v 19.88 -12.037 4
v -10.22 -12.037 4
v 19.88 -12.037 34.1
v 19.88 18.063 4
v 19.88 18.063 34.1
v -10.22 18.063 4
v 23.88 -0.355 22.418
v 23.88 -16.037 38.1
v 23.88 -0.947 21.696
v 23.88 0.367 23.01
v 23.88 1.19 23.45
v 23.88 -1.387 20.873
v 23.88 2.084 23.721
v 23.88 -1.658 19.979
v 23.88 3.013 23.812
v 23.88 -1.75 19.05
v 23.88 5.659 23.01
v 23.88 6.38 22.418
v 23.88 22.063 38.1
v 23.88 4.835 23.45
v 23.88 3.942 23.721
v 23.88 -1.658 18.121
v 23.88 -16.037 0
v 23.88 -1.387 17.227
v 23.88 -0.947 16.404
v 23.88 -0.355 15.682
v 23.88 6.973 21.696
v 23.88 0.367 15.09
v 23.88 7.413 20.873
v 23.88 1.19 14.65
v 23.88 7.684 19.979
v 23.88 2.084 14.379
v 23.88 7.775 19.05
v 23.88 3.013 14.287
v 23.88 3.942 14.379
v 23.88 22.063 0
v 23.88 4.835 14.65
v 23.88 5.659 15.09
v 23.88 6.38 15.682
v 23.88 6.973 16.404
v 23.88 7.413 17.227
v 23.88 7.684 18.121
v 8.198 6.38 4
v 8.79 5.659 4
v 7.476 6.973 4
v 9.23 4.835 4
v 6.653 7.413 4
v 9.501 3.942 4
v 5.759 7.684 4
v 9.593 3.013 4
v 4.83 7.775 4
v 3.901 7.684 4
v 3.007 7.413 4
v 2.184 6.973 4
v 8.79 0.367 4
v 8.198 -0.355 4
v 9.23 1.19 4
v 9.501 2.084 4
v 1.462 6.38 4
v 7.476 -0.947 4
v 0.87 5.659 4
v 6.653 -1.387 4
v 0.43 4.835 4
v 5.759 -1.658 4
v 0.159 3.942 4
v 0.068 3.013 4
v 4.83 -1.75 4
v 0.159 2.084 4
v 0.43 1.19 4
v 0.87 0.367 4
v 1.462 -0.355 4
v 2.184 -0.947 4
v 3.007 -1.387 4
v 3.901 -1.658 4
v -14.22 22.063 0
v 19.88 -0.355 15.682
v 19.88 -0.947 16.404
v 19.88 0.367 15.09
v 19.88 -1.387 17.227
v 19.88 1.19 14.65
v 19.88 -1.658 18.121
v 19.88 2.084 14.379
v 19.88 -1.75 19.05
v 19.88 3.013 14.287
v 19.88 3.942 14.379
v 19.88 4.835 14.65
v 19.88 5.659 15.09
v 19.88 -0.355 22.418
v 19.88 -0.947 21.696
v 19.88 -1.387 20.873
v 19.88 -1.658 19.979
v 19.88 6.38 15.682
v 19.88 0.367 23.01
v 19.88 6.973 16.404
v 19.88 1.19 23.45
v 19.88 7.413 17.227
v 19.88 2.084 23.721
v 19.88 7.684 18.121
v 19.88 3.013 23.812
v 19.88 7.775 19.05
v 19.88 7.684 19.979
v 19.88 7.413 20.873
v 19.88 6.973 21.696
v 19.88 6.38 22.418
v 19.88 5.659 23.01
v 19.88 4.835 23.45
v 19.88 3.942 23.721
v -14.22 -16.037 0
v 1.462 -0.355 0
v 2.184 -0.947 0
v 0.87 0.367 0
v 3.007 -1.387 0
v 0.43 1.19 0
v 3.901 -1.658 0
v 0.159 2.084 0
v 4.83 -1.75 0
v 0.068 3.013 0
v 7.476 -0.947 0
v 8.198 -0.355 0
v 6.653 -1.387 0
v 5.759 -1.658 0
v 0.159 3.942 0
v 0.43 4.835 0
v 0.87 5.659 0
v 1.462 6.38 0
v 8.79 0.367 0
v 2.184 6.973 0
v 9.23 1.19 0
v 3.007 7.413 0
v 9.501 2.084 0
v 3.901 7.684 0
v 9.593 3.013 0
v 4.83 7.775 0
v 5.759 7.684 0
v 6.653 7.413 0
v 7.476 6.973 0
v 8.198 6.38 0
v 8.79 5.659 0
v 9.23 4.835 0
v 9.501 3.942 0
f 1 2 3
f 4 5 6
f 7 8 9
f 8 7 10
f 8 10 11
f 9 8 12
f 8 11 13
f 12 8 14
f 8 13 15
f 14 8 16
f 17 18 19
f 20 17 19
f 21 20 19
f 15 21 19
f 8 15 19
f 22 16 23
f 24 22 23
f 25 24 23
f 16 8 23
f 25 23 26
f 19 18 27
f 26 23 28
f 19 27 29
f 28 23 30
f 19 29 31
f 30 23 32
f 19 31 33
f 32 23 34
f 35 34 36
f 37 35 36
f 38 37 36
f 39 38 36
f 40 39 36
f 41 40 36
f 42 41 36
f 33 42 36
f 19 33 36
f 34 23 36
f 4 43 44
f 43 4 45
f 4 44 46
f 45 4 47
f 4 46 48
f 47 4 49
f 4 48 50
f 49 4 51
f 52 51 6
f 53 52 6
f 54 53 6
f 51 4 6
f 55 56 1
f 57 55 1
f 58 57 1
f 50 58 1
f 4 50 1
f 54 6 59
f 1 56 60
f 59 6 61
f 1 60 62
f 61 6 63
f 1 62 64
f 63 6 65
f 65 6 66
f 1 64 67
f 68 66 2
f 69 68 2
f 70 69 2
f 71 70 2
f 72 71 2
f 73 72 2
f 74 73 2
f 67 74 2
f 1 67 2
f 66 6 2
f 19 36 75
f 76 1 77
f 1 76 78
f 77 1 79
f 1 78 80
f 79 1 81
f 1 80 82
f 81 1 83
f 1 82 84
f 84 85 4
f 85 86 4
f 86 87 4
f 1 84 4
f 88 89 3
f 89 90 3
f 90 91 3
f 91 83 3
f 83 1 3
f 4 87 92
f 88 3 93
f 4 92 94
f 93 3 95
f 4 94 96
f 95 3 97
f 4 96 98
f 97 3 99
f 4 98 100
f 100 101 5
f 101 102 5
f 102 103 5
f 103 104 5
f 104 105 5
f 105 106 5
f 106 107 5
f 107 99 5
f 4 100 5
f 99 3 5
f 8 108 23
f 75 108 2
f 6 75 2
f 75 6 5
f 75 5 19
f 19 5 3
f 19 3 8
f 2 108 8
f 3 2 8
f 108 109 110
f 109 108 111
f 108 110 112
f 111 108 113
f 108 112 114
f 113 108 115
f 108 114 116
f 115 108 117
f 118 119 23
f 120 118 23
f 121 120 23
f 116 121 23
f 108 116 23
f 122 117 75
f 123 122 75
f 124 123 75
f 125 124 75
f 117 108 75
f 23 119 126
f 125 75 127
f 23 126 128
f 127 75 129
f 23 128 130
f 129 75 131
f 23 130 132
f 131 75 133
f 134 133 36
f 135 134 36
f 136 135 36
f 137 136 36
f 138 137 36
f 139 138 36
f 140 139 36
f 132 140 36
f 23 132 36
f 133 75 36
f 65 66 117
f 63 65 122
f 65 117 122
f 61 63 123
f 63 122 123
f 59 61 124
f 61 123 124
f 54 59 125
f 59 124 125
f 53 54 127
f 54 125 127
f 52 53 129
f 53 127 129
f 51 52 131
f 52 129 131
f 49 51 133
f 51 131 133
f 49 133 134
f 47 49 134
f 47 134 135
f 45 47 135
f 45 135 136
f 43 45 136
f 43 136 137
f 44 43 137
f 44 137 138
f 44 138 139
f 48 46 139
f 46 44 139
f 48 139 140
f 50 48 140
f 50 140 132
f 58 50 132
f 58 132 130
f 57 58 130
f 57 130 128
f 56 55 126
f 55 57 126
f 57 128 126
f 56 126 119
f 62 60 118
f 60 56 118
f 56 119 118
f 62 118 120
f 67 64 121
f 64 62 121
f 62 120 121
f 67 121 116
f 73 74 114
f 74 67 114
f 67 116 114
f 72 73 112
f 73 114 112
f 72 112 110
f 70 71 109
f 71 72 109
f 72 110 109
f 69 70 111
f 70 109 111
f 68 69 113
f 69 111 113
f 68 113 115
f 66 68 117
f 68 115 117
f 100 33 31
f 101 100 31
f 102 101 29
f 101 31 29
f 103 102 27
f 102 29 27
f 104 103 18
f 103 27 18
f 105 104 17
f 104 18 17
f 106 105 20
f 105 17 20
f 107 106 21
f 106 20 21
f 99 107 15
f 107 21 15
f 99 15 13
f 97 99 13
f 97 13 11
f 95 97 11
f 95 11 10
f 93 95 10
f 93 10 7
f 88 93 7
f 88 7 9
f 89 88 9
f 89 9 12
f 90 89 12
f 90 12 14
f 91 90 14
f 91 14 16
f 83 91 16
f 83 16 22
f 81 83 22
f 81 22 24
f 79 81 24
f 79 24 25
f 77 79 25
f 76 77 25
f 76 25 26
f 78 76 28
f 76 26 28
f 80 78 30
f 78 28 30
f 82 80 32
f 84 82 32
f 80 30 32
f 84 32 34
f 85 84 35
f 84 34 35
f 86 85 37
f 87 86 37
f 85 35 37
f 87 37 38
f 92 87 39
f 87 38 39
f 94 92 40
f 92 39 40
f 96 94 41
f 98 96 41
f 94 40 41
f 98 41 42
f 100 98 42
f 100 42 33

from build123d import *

# Parameters (mm, degrees)
F1_DEPTH = 38.1
F3_DEPTH = 25
F5_R     = 4.7625
F6_DEPTH = 34.1
F8_DEPTH = 34.1
F9_DEPTH = 50


with BuildPart() as f1:
    # F0 (on Top) → F1 (new body)
    with BuildSketch(Plane.XY):
        Polygon((23.88, 22.062646), (-14.22, 22.062646), (-14.22, 3.012646), (-14.22, -16.037354), (23.88, -16.037354), align=None)
        with BuildLine():
            ThreePointArc((9.5925, 3.012646), (4.83, -1.749854), (0.0675, 3.012646))
            ThreePointArc((0.0675, 3.012646), (4.83, 7.775146), (9.5925, 3.012646))
        make_face(mode=Mode.SUBTRACT)
    extrude(amount=F1_DEPTH)

    # F2 (on face) → F3 (cut)
    with BuildSketch(Plane.YZ.offset(23.88)):
        with BuildLine():
            ThreePointArc((-1.749854, 19.05), (3.012646, 14.2875), (7.775146, 19.05))
            ThreePointArc((7.775146, 19.05), (3.012646, 23.8125), (-1.749854, 19.05))
        make_face()
    extrude(amount=-F3_DEPTH, mode=Mode.SUBTRACT)

    # F5 (on face) → F6 (cut)
    with BuildSketch(Plane.XY.offset(38.1)):
        Polygon((19.88, 18.062646), (4.83, 18.062646), (-10.22, 18.062646), (-10.22, 3.012646), (-10.22, -12.037354), (4.83, -12.037354), (19.88, -12.037354), (19.88, 3.012646), align=None)
        with Locations((4.83, 3.012646)):
            Circle(F5_R, mode=Mode.SUBTRACT)
    extrude(amount=-F6_DEPTH, mode=Mode.SUBTRACT)

    # F7 (on face) → F8 (cut)
    with BuildSketch(Plane(origin=(-14.22, 0, 0), x_dir=(0, -1, 0), z_dir=(-1, 0, 0))):
        Polygon((12.037354, 34.1), (-3.012646, 34.1), (-18.062646, 34.1), (-18.062646, 19.05), (-18.062646, 4), (-3.012646, 4), (12.037354, 4), (12.037354, 19.05), align=None)
    extrude(amount=-F8_DEPTH, mode=Mode.SUBTRACT)

    # F4 (on face) → F9 (cut)
    with BuildSketch(Plane.XZ.offset(16.037354)):
        Polygon((-14.22, 0), (23.88, 38.1), (-14.22, 38.1), align=None)
    extrude(amount=-F9_DEPTH, mode=Mode.SUBTRACT)


solid = f1.part
